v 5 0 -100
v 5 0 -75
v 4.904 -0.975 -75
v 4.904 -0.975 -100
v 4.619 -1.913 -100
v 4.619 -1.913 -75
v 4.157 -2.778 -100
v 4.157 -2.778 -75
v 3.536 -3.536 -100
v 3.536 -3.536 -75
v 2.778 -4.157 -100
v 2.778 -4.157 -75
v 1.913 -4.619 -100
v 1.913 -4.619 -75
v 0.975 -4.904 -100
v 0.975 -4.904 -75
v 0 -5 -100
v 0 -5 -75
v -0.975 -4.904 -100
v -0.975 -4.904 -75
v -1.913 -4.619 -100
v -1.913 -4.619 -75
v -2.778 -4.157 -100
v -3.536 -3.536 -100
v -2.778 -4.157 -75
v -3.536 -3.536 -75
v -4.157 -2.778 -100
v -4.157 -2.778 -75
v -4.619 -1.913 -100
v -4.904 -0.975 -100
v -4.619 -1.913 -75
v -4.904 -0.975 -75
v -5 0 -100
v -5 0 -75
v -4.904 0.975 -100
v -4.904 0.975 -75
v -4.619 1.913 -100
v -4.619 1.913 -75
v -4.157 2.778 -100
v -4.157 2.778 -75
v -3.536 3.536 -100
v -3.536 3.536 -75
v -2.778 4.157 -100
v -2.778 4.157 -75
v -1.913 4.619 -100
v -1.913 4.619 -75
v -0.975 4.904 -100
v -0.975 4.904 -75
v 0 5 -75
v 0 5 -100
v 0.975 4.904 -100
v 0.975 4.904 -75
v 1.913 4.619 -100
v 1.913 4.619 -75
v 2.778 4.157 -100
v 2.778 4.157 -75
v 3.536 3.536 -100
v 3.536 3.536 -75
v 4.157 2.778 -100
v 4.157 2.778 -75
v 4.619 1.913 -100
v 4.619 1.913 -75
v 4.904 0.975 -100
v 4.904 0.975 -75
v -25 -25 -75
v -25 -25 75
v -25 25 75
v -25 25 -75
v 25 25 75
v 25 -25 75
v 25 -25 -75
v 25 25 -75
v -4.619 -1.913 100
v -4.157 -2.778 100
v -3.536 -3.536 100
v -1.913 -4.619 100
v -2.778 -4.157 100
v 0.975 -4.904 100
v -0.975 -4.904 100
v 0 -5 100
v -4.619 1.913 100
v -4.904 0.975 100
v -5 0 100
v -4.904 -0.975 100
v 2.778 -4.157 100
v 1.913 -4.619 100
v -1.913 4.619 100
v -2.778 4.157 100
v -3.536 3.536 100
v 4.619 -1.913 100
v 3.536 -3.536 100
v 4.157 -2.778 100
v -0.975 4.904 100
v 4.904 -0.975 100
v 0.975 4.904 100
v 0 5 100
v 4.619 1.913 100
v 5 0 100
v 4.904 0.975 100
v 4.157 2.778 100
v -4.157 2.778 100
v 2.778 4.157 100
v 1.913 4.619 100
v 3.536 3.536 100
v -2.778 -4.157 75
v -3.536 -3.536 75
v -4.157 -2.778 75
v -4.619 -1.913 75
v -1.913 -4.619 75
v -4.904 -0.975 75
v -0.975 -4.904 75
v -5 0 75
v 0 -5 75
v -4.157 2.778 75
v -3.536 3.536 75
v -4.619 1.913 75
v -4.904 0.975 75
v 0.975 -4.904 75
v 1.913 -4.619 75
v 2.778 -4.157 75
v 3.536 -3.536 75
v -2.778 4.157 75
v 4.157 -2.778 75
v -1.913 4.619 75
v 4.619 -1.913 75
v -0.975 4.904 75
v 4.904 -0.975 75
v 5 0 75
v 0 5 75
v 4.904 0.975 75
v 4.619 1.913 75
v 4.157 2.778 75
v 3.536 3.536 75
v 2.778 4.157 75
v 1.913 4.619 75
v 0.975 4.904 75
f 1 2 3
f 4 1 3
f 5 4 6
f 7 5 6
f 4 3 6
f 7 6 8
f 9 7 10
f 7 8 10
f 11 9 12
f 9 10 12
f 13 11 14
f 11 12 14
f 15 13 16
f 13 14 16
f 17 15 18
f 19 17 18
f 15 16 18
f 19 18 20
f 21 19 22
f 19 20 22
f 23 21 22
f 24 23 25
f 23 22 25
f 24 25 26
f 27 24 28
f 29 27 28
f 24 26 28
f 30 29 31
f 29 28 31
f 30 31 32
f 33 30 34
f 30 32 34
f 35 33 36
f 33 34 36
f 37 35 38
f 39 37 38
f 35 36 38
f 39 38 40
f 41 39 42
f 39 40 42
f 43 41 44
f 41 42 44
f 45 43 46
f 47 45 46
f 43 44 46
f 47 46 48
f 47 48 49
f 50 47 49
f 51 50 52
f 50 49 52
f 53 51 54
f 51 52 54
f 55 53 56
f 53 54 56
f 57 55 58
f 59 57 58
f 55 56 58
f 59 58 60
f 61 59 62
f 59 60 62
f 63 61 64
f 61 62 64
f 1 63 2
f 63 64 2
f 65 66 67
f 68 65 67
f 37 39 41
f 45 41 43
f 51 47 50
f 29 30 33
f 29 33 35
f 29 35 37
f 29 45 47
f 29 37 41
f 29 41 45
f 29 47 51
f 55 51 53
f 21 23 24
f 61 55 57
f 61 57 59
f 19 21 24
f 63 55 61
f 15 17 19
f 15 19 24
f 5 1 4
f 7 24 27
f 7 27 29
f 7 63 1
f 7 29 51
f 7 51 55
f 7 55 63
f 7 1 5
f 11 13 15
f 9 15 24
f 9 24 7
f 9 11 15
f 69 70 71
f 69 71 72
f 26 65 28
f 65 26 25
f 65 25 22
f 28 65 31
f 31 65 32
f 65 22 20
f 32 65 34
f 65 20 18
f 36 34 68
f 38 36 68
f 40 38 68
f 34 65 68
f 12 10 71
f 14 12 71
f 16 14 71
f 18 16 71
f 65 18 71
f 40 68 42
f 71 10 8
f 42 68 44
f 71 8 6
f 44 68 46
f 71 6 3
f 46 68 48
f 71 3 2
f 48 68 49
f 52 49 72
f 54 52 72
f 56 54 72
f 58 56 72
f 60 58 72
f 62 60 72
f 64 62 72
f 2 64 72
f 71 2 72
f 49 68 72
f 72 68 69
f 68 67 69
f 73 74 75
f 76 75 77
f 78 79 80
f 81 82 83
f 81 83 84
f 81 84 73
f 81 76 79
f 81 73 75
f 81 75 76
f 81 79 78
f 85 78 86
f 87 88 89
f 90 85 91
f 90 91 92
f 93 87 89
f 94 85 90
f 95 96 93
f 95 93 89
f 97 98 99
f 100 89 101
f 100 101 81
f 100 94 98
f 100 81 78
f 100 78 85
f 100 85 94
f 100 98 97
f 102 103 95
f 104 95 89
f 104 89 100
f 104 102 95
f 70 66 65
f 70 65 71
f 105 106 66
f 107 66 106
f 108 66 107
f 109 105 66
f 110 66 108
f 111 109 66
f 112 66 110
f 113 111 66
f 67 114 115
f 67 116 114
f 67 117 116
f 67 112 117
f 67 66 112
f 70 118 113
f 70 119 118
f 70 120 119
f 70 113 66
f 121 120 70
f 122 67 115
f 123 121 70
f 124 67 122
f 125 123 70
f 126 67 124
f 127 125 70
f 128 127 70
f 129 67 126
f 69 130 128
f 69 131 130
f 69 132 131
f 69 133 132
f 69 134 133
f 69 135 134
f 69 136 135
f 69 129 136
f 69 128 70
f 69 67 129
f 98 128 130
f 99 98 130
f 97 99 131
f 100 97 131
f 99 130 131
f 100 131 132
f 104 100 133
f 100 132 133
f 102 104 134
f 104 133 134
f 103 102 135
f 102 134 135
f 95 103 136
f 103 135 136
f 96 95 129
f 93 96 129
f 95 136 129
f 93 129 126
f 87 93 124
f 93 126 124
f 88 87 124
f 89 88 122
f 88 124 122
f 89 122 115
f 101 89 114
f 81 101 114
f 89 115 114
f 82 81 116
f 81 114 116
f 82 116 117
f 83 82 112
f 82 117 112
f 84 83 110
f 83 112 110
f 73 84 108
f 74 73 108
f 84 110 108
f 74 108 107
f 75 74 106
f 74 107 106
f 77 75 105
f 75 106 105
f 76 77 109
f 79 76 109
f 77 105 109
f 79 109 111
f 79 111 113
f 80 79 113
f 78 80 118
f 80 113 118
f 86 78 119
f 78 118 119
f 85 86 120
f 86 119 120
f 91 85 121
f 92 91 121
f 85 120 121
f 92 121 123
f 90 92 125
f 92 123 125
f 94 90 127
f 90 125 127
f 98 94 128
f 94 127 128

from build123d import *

# Parameters (mm, degrees)
F0_W     = 50
F0_H     = 50
F1_DEPTH = 75
F2_R     = 5
F3_DEPTH = 25
F4_R     = 5
F5_DEPTH = 25


with BuildPart() as f1:
    # F0 (on Top) → F1 (new body, symmetric)
    with BuildSketch(Plane.XY):
        Rectangle(F0_W, F0_H)
    extrude(amount=F1_DEPTH, both=True)

    # F2 (on face) → F3 (join)
    with BuildSketch(Plane(origin=(0, 0, -75), x_dir=(1, 0, 0), z_dir=(0, 0, -1))):
        Circle(F2_R)
    extrude(amount=F3_DEPTH)

    # F4 (on face) → F5 (join)
    with BuildSketch(Plane.XY.offset(75)):
        Circle(F4_R)
    extrude(amount=F5_DEPTH)


solid = f1.part
